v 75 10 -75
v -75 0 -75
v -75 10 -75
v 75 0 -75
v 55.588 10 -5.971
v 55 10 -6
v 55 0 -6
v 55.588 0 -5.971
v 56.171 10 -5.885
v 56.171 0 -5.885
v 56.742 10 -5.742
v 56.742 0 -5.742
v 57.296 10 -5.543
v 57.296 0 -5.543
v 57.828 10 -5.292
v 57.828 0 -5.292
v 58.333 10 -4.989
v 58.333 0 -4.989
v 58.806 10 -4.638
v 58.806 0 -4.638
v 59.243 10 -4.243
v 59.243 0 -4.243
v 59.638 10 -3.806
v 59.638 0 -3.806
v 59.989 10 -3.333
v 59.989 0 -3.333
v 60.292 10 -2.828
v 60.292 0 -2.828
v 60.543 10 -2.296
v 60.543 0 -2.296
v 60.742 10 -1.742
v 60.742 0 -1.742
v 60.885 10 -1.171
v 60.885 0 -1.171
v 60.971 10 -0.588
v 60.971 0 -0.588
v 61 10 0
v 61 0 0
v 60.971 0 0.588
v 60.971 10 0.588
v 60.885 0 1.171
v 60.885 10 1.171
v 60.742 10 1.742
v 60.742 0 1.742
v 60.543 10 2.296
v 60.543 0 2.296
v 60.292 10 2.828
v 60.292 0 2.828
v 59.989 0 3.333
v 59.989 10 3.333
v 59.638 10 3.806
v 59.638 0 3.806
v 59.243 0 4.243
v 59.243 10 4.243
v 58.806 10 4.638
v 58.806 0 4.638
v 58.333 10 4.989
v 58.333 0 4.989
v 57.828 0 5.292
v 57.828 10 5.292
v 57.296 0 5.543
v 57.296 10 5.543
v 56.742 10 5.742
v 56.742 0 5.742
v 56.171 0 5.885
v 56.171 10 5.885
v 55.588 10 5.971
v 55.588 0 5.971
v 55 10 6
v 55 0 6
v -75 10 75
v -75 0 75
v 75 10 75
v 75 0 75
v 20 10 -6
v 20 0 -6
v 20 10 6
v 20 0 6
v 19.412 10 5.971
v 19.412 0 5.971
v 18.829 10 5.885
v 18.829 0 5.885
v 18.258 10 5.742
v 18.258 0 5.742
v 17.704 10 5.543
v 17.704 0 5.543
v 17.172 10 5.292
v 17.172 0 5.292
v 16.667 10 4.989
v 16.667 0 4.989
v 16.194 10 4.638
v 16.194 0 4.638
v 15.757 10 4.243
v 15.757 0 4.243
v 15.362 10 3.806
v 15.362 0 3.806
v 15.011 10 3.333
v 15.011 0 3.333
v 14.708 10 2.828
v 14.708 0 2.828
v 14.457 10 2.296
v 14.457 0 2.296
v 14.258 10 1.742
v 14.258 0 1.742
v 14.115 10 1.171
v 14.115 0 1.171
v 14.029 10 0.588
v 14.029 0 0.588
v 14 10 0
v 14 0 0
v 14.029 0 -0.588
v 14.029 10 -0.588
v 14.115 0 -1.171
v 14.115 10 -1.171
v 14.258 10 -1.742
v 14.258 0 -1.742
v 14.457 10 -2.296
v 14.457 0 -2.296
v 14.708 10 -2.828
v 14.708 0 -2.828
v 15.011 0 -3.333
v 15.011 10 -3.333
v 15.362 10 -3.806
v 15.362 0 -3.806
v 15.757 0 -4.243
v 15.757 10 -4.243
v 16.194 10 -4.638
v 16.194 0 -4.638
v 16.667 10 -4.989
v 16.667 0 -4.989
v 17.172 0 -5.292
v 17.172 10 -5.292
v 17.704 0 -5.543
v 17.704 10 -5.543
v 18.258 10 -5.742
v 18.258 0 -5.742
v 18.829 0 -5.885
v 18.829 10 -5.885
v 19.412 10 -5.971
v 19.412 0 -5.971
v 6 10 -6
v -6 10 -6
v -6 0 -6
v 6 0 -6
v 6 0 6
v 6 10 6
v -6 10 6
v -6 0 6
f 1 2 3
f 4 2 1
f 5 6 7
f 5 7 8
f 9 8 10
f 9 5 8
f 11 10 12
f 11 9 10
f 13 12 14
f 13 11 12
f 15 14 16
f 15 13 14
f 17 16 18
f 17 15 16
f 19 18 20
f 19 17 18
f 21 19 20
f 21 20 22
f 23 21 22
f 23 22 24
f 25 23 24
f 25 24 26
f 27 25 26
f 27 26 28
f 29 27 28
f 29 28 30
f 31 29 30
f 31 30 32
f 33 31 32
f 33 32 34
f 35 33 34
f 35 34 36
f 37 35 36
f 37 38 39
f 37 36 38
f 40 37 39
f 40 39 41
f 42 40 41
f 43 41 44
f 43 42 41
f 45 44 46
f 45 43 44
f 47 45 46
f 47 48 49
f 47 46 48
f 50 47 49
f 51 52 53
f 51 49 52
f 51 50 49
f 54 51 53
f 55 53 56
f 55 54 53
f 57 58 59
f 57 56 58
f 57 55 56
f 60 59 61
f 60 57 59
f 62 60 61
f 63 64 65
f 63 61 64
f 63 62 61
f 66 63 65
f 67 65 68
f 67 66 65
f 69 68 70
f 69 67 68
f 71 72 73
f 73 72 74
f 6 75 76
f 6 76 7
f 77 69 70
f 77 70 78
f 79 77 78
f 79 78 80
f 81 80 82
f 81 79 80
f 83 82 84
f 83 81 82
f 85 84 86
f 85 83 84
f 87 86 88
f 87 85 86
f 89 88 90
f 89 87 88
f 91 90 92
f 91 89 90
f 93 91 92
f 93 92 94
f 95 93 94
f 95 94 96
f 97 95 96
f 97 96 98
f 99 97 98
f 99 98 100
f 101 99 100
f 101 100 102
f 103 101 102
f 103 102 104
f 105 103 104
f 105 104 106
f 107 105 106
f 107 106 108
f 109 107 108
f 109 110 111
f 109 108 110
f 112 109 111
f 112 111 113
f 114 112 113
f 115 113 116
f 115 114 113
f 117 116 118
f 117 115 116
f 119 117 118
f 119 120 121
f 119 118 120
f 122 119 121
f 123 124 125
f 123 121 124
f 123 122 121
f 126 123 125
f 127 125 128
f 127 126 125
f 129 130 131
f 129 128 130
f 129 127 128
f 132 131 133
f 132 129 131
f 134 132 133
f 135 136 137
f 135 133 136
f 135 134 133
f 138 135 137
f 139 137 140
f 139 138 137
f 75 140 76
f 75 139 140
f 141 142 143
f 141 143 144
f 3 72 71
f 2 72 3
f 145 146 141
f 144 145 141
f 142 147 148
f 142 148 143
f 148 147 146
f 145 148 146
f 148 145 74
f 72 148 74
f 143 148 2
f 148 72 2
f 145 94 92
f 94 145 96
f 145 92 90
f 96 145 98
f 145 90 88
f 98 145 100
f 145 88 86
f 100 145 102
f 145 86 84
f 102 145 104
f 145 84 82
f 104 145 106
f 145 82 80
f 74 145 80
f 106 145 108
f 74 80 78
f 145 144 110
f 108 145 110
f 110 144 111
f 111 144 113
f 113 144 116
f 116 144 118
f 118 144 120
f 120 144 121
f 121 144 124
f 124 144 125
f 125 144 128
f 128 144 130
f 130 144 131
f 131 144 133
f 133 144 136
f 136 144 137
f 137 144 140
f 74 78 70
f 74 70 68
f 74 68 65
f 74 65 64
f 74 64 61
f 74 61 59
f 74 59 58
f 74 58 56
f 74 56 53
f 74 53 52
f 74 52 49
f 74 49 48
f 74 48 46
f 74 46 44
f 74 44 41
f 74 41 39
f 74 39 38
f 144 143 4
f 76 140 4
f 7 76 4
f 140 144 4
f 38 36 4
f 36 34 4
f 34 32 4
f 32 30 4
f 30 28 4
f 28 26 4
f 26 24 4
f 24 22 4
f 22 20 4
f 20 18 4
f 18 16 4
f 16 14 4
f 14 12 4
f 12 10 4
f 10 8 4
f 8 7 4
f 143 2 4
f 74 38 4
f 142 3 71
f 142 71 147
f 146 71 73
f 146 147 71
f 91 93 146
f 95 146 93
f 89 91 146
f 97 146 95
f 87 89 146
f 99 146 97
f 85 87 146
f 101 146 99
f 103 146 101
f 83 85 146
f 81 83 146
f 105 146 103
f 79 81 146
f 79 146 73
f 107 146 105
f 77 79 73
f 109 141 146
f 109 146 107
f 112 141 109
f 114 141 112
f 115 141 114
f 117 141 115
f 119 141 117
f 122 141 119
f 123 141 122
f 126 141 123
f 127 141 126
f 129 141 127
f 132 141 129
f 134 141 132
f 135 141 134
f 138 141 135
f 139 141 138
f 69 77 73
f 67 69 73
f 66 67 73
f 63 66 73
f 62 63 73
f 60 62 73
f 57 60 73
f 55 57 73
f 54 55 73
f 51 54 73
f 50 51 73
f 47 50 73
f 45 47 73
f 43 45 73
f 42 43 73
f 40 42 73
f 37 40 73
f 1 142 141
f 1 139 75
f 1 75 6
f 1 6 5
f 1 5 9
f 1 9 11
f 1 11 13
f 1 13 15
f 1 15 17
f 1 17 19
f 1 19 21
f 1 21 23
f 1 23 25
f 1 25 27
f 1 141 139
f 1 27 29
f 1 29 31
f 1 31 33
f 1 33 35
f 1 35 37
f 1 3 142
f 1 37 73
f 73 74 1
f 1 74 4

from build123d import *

# Parameters (mm, degrees)
SKETCH1_W           = 150
SKETCH1_H           = 150
BOSS_EXTRUDE1_DEPTH = 10
SKETCH3_W           = 12
SKETCH3_H           = 12
CUT_EXTRUDE2_DEPTH  = 107.536378763
CUT_EXTRUDE1_DEPTH  = 107.536378763


with BuildPart() as part:
    # Sketch1 → Boss-Extrude1 (new body)
    with BuildSketch(Plane(origin=(0, 0, 0), x_dir=(1, 0, 0), z_dir=(0, 1, 0))):
        Rectangle(SKETCH1_W, SKETCH1_H)
    extrude(amount=BOSS_EXTRUDE1_DEPTH)

    # Sketch3 → Cut-Extrude2 (cut, through all)
    with BuildSketch(Plane(origin=(0, 10, 0), x_dir=(1, 0, 0), z_dir=(0, 1, 0))):
        Rectangle(SKETCH3_W, SKETCH3_H)
    extrude(amount=-CUT_EXTRUDE2_DEPTH, mode=Mode.SUBTRACT)

    # Sketch2 → Cut-Extrude1 (cut, through all)
    with BuildSketch(Plane(origin=(0, 10, 0), x_dir=(1, 0, 0), z_dir=(0, 1, 0))):
        with BuildLine():
            Line((20, 6), (55, 6))
            ThreePointArc((55, 6), (61, 0), (55, -6))
            Line((55, -6), (20, -6))
            ThreePointArc((20, -6), (14, 0), (20, 6))
        make_face()
    extrude(amount=-CUT_EXTRUDE1_DEPTH, mode=Mode.SUBTRACT)


solid = part.part
